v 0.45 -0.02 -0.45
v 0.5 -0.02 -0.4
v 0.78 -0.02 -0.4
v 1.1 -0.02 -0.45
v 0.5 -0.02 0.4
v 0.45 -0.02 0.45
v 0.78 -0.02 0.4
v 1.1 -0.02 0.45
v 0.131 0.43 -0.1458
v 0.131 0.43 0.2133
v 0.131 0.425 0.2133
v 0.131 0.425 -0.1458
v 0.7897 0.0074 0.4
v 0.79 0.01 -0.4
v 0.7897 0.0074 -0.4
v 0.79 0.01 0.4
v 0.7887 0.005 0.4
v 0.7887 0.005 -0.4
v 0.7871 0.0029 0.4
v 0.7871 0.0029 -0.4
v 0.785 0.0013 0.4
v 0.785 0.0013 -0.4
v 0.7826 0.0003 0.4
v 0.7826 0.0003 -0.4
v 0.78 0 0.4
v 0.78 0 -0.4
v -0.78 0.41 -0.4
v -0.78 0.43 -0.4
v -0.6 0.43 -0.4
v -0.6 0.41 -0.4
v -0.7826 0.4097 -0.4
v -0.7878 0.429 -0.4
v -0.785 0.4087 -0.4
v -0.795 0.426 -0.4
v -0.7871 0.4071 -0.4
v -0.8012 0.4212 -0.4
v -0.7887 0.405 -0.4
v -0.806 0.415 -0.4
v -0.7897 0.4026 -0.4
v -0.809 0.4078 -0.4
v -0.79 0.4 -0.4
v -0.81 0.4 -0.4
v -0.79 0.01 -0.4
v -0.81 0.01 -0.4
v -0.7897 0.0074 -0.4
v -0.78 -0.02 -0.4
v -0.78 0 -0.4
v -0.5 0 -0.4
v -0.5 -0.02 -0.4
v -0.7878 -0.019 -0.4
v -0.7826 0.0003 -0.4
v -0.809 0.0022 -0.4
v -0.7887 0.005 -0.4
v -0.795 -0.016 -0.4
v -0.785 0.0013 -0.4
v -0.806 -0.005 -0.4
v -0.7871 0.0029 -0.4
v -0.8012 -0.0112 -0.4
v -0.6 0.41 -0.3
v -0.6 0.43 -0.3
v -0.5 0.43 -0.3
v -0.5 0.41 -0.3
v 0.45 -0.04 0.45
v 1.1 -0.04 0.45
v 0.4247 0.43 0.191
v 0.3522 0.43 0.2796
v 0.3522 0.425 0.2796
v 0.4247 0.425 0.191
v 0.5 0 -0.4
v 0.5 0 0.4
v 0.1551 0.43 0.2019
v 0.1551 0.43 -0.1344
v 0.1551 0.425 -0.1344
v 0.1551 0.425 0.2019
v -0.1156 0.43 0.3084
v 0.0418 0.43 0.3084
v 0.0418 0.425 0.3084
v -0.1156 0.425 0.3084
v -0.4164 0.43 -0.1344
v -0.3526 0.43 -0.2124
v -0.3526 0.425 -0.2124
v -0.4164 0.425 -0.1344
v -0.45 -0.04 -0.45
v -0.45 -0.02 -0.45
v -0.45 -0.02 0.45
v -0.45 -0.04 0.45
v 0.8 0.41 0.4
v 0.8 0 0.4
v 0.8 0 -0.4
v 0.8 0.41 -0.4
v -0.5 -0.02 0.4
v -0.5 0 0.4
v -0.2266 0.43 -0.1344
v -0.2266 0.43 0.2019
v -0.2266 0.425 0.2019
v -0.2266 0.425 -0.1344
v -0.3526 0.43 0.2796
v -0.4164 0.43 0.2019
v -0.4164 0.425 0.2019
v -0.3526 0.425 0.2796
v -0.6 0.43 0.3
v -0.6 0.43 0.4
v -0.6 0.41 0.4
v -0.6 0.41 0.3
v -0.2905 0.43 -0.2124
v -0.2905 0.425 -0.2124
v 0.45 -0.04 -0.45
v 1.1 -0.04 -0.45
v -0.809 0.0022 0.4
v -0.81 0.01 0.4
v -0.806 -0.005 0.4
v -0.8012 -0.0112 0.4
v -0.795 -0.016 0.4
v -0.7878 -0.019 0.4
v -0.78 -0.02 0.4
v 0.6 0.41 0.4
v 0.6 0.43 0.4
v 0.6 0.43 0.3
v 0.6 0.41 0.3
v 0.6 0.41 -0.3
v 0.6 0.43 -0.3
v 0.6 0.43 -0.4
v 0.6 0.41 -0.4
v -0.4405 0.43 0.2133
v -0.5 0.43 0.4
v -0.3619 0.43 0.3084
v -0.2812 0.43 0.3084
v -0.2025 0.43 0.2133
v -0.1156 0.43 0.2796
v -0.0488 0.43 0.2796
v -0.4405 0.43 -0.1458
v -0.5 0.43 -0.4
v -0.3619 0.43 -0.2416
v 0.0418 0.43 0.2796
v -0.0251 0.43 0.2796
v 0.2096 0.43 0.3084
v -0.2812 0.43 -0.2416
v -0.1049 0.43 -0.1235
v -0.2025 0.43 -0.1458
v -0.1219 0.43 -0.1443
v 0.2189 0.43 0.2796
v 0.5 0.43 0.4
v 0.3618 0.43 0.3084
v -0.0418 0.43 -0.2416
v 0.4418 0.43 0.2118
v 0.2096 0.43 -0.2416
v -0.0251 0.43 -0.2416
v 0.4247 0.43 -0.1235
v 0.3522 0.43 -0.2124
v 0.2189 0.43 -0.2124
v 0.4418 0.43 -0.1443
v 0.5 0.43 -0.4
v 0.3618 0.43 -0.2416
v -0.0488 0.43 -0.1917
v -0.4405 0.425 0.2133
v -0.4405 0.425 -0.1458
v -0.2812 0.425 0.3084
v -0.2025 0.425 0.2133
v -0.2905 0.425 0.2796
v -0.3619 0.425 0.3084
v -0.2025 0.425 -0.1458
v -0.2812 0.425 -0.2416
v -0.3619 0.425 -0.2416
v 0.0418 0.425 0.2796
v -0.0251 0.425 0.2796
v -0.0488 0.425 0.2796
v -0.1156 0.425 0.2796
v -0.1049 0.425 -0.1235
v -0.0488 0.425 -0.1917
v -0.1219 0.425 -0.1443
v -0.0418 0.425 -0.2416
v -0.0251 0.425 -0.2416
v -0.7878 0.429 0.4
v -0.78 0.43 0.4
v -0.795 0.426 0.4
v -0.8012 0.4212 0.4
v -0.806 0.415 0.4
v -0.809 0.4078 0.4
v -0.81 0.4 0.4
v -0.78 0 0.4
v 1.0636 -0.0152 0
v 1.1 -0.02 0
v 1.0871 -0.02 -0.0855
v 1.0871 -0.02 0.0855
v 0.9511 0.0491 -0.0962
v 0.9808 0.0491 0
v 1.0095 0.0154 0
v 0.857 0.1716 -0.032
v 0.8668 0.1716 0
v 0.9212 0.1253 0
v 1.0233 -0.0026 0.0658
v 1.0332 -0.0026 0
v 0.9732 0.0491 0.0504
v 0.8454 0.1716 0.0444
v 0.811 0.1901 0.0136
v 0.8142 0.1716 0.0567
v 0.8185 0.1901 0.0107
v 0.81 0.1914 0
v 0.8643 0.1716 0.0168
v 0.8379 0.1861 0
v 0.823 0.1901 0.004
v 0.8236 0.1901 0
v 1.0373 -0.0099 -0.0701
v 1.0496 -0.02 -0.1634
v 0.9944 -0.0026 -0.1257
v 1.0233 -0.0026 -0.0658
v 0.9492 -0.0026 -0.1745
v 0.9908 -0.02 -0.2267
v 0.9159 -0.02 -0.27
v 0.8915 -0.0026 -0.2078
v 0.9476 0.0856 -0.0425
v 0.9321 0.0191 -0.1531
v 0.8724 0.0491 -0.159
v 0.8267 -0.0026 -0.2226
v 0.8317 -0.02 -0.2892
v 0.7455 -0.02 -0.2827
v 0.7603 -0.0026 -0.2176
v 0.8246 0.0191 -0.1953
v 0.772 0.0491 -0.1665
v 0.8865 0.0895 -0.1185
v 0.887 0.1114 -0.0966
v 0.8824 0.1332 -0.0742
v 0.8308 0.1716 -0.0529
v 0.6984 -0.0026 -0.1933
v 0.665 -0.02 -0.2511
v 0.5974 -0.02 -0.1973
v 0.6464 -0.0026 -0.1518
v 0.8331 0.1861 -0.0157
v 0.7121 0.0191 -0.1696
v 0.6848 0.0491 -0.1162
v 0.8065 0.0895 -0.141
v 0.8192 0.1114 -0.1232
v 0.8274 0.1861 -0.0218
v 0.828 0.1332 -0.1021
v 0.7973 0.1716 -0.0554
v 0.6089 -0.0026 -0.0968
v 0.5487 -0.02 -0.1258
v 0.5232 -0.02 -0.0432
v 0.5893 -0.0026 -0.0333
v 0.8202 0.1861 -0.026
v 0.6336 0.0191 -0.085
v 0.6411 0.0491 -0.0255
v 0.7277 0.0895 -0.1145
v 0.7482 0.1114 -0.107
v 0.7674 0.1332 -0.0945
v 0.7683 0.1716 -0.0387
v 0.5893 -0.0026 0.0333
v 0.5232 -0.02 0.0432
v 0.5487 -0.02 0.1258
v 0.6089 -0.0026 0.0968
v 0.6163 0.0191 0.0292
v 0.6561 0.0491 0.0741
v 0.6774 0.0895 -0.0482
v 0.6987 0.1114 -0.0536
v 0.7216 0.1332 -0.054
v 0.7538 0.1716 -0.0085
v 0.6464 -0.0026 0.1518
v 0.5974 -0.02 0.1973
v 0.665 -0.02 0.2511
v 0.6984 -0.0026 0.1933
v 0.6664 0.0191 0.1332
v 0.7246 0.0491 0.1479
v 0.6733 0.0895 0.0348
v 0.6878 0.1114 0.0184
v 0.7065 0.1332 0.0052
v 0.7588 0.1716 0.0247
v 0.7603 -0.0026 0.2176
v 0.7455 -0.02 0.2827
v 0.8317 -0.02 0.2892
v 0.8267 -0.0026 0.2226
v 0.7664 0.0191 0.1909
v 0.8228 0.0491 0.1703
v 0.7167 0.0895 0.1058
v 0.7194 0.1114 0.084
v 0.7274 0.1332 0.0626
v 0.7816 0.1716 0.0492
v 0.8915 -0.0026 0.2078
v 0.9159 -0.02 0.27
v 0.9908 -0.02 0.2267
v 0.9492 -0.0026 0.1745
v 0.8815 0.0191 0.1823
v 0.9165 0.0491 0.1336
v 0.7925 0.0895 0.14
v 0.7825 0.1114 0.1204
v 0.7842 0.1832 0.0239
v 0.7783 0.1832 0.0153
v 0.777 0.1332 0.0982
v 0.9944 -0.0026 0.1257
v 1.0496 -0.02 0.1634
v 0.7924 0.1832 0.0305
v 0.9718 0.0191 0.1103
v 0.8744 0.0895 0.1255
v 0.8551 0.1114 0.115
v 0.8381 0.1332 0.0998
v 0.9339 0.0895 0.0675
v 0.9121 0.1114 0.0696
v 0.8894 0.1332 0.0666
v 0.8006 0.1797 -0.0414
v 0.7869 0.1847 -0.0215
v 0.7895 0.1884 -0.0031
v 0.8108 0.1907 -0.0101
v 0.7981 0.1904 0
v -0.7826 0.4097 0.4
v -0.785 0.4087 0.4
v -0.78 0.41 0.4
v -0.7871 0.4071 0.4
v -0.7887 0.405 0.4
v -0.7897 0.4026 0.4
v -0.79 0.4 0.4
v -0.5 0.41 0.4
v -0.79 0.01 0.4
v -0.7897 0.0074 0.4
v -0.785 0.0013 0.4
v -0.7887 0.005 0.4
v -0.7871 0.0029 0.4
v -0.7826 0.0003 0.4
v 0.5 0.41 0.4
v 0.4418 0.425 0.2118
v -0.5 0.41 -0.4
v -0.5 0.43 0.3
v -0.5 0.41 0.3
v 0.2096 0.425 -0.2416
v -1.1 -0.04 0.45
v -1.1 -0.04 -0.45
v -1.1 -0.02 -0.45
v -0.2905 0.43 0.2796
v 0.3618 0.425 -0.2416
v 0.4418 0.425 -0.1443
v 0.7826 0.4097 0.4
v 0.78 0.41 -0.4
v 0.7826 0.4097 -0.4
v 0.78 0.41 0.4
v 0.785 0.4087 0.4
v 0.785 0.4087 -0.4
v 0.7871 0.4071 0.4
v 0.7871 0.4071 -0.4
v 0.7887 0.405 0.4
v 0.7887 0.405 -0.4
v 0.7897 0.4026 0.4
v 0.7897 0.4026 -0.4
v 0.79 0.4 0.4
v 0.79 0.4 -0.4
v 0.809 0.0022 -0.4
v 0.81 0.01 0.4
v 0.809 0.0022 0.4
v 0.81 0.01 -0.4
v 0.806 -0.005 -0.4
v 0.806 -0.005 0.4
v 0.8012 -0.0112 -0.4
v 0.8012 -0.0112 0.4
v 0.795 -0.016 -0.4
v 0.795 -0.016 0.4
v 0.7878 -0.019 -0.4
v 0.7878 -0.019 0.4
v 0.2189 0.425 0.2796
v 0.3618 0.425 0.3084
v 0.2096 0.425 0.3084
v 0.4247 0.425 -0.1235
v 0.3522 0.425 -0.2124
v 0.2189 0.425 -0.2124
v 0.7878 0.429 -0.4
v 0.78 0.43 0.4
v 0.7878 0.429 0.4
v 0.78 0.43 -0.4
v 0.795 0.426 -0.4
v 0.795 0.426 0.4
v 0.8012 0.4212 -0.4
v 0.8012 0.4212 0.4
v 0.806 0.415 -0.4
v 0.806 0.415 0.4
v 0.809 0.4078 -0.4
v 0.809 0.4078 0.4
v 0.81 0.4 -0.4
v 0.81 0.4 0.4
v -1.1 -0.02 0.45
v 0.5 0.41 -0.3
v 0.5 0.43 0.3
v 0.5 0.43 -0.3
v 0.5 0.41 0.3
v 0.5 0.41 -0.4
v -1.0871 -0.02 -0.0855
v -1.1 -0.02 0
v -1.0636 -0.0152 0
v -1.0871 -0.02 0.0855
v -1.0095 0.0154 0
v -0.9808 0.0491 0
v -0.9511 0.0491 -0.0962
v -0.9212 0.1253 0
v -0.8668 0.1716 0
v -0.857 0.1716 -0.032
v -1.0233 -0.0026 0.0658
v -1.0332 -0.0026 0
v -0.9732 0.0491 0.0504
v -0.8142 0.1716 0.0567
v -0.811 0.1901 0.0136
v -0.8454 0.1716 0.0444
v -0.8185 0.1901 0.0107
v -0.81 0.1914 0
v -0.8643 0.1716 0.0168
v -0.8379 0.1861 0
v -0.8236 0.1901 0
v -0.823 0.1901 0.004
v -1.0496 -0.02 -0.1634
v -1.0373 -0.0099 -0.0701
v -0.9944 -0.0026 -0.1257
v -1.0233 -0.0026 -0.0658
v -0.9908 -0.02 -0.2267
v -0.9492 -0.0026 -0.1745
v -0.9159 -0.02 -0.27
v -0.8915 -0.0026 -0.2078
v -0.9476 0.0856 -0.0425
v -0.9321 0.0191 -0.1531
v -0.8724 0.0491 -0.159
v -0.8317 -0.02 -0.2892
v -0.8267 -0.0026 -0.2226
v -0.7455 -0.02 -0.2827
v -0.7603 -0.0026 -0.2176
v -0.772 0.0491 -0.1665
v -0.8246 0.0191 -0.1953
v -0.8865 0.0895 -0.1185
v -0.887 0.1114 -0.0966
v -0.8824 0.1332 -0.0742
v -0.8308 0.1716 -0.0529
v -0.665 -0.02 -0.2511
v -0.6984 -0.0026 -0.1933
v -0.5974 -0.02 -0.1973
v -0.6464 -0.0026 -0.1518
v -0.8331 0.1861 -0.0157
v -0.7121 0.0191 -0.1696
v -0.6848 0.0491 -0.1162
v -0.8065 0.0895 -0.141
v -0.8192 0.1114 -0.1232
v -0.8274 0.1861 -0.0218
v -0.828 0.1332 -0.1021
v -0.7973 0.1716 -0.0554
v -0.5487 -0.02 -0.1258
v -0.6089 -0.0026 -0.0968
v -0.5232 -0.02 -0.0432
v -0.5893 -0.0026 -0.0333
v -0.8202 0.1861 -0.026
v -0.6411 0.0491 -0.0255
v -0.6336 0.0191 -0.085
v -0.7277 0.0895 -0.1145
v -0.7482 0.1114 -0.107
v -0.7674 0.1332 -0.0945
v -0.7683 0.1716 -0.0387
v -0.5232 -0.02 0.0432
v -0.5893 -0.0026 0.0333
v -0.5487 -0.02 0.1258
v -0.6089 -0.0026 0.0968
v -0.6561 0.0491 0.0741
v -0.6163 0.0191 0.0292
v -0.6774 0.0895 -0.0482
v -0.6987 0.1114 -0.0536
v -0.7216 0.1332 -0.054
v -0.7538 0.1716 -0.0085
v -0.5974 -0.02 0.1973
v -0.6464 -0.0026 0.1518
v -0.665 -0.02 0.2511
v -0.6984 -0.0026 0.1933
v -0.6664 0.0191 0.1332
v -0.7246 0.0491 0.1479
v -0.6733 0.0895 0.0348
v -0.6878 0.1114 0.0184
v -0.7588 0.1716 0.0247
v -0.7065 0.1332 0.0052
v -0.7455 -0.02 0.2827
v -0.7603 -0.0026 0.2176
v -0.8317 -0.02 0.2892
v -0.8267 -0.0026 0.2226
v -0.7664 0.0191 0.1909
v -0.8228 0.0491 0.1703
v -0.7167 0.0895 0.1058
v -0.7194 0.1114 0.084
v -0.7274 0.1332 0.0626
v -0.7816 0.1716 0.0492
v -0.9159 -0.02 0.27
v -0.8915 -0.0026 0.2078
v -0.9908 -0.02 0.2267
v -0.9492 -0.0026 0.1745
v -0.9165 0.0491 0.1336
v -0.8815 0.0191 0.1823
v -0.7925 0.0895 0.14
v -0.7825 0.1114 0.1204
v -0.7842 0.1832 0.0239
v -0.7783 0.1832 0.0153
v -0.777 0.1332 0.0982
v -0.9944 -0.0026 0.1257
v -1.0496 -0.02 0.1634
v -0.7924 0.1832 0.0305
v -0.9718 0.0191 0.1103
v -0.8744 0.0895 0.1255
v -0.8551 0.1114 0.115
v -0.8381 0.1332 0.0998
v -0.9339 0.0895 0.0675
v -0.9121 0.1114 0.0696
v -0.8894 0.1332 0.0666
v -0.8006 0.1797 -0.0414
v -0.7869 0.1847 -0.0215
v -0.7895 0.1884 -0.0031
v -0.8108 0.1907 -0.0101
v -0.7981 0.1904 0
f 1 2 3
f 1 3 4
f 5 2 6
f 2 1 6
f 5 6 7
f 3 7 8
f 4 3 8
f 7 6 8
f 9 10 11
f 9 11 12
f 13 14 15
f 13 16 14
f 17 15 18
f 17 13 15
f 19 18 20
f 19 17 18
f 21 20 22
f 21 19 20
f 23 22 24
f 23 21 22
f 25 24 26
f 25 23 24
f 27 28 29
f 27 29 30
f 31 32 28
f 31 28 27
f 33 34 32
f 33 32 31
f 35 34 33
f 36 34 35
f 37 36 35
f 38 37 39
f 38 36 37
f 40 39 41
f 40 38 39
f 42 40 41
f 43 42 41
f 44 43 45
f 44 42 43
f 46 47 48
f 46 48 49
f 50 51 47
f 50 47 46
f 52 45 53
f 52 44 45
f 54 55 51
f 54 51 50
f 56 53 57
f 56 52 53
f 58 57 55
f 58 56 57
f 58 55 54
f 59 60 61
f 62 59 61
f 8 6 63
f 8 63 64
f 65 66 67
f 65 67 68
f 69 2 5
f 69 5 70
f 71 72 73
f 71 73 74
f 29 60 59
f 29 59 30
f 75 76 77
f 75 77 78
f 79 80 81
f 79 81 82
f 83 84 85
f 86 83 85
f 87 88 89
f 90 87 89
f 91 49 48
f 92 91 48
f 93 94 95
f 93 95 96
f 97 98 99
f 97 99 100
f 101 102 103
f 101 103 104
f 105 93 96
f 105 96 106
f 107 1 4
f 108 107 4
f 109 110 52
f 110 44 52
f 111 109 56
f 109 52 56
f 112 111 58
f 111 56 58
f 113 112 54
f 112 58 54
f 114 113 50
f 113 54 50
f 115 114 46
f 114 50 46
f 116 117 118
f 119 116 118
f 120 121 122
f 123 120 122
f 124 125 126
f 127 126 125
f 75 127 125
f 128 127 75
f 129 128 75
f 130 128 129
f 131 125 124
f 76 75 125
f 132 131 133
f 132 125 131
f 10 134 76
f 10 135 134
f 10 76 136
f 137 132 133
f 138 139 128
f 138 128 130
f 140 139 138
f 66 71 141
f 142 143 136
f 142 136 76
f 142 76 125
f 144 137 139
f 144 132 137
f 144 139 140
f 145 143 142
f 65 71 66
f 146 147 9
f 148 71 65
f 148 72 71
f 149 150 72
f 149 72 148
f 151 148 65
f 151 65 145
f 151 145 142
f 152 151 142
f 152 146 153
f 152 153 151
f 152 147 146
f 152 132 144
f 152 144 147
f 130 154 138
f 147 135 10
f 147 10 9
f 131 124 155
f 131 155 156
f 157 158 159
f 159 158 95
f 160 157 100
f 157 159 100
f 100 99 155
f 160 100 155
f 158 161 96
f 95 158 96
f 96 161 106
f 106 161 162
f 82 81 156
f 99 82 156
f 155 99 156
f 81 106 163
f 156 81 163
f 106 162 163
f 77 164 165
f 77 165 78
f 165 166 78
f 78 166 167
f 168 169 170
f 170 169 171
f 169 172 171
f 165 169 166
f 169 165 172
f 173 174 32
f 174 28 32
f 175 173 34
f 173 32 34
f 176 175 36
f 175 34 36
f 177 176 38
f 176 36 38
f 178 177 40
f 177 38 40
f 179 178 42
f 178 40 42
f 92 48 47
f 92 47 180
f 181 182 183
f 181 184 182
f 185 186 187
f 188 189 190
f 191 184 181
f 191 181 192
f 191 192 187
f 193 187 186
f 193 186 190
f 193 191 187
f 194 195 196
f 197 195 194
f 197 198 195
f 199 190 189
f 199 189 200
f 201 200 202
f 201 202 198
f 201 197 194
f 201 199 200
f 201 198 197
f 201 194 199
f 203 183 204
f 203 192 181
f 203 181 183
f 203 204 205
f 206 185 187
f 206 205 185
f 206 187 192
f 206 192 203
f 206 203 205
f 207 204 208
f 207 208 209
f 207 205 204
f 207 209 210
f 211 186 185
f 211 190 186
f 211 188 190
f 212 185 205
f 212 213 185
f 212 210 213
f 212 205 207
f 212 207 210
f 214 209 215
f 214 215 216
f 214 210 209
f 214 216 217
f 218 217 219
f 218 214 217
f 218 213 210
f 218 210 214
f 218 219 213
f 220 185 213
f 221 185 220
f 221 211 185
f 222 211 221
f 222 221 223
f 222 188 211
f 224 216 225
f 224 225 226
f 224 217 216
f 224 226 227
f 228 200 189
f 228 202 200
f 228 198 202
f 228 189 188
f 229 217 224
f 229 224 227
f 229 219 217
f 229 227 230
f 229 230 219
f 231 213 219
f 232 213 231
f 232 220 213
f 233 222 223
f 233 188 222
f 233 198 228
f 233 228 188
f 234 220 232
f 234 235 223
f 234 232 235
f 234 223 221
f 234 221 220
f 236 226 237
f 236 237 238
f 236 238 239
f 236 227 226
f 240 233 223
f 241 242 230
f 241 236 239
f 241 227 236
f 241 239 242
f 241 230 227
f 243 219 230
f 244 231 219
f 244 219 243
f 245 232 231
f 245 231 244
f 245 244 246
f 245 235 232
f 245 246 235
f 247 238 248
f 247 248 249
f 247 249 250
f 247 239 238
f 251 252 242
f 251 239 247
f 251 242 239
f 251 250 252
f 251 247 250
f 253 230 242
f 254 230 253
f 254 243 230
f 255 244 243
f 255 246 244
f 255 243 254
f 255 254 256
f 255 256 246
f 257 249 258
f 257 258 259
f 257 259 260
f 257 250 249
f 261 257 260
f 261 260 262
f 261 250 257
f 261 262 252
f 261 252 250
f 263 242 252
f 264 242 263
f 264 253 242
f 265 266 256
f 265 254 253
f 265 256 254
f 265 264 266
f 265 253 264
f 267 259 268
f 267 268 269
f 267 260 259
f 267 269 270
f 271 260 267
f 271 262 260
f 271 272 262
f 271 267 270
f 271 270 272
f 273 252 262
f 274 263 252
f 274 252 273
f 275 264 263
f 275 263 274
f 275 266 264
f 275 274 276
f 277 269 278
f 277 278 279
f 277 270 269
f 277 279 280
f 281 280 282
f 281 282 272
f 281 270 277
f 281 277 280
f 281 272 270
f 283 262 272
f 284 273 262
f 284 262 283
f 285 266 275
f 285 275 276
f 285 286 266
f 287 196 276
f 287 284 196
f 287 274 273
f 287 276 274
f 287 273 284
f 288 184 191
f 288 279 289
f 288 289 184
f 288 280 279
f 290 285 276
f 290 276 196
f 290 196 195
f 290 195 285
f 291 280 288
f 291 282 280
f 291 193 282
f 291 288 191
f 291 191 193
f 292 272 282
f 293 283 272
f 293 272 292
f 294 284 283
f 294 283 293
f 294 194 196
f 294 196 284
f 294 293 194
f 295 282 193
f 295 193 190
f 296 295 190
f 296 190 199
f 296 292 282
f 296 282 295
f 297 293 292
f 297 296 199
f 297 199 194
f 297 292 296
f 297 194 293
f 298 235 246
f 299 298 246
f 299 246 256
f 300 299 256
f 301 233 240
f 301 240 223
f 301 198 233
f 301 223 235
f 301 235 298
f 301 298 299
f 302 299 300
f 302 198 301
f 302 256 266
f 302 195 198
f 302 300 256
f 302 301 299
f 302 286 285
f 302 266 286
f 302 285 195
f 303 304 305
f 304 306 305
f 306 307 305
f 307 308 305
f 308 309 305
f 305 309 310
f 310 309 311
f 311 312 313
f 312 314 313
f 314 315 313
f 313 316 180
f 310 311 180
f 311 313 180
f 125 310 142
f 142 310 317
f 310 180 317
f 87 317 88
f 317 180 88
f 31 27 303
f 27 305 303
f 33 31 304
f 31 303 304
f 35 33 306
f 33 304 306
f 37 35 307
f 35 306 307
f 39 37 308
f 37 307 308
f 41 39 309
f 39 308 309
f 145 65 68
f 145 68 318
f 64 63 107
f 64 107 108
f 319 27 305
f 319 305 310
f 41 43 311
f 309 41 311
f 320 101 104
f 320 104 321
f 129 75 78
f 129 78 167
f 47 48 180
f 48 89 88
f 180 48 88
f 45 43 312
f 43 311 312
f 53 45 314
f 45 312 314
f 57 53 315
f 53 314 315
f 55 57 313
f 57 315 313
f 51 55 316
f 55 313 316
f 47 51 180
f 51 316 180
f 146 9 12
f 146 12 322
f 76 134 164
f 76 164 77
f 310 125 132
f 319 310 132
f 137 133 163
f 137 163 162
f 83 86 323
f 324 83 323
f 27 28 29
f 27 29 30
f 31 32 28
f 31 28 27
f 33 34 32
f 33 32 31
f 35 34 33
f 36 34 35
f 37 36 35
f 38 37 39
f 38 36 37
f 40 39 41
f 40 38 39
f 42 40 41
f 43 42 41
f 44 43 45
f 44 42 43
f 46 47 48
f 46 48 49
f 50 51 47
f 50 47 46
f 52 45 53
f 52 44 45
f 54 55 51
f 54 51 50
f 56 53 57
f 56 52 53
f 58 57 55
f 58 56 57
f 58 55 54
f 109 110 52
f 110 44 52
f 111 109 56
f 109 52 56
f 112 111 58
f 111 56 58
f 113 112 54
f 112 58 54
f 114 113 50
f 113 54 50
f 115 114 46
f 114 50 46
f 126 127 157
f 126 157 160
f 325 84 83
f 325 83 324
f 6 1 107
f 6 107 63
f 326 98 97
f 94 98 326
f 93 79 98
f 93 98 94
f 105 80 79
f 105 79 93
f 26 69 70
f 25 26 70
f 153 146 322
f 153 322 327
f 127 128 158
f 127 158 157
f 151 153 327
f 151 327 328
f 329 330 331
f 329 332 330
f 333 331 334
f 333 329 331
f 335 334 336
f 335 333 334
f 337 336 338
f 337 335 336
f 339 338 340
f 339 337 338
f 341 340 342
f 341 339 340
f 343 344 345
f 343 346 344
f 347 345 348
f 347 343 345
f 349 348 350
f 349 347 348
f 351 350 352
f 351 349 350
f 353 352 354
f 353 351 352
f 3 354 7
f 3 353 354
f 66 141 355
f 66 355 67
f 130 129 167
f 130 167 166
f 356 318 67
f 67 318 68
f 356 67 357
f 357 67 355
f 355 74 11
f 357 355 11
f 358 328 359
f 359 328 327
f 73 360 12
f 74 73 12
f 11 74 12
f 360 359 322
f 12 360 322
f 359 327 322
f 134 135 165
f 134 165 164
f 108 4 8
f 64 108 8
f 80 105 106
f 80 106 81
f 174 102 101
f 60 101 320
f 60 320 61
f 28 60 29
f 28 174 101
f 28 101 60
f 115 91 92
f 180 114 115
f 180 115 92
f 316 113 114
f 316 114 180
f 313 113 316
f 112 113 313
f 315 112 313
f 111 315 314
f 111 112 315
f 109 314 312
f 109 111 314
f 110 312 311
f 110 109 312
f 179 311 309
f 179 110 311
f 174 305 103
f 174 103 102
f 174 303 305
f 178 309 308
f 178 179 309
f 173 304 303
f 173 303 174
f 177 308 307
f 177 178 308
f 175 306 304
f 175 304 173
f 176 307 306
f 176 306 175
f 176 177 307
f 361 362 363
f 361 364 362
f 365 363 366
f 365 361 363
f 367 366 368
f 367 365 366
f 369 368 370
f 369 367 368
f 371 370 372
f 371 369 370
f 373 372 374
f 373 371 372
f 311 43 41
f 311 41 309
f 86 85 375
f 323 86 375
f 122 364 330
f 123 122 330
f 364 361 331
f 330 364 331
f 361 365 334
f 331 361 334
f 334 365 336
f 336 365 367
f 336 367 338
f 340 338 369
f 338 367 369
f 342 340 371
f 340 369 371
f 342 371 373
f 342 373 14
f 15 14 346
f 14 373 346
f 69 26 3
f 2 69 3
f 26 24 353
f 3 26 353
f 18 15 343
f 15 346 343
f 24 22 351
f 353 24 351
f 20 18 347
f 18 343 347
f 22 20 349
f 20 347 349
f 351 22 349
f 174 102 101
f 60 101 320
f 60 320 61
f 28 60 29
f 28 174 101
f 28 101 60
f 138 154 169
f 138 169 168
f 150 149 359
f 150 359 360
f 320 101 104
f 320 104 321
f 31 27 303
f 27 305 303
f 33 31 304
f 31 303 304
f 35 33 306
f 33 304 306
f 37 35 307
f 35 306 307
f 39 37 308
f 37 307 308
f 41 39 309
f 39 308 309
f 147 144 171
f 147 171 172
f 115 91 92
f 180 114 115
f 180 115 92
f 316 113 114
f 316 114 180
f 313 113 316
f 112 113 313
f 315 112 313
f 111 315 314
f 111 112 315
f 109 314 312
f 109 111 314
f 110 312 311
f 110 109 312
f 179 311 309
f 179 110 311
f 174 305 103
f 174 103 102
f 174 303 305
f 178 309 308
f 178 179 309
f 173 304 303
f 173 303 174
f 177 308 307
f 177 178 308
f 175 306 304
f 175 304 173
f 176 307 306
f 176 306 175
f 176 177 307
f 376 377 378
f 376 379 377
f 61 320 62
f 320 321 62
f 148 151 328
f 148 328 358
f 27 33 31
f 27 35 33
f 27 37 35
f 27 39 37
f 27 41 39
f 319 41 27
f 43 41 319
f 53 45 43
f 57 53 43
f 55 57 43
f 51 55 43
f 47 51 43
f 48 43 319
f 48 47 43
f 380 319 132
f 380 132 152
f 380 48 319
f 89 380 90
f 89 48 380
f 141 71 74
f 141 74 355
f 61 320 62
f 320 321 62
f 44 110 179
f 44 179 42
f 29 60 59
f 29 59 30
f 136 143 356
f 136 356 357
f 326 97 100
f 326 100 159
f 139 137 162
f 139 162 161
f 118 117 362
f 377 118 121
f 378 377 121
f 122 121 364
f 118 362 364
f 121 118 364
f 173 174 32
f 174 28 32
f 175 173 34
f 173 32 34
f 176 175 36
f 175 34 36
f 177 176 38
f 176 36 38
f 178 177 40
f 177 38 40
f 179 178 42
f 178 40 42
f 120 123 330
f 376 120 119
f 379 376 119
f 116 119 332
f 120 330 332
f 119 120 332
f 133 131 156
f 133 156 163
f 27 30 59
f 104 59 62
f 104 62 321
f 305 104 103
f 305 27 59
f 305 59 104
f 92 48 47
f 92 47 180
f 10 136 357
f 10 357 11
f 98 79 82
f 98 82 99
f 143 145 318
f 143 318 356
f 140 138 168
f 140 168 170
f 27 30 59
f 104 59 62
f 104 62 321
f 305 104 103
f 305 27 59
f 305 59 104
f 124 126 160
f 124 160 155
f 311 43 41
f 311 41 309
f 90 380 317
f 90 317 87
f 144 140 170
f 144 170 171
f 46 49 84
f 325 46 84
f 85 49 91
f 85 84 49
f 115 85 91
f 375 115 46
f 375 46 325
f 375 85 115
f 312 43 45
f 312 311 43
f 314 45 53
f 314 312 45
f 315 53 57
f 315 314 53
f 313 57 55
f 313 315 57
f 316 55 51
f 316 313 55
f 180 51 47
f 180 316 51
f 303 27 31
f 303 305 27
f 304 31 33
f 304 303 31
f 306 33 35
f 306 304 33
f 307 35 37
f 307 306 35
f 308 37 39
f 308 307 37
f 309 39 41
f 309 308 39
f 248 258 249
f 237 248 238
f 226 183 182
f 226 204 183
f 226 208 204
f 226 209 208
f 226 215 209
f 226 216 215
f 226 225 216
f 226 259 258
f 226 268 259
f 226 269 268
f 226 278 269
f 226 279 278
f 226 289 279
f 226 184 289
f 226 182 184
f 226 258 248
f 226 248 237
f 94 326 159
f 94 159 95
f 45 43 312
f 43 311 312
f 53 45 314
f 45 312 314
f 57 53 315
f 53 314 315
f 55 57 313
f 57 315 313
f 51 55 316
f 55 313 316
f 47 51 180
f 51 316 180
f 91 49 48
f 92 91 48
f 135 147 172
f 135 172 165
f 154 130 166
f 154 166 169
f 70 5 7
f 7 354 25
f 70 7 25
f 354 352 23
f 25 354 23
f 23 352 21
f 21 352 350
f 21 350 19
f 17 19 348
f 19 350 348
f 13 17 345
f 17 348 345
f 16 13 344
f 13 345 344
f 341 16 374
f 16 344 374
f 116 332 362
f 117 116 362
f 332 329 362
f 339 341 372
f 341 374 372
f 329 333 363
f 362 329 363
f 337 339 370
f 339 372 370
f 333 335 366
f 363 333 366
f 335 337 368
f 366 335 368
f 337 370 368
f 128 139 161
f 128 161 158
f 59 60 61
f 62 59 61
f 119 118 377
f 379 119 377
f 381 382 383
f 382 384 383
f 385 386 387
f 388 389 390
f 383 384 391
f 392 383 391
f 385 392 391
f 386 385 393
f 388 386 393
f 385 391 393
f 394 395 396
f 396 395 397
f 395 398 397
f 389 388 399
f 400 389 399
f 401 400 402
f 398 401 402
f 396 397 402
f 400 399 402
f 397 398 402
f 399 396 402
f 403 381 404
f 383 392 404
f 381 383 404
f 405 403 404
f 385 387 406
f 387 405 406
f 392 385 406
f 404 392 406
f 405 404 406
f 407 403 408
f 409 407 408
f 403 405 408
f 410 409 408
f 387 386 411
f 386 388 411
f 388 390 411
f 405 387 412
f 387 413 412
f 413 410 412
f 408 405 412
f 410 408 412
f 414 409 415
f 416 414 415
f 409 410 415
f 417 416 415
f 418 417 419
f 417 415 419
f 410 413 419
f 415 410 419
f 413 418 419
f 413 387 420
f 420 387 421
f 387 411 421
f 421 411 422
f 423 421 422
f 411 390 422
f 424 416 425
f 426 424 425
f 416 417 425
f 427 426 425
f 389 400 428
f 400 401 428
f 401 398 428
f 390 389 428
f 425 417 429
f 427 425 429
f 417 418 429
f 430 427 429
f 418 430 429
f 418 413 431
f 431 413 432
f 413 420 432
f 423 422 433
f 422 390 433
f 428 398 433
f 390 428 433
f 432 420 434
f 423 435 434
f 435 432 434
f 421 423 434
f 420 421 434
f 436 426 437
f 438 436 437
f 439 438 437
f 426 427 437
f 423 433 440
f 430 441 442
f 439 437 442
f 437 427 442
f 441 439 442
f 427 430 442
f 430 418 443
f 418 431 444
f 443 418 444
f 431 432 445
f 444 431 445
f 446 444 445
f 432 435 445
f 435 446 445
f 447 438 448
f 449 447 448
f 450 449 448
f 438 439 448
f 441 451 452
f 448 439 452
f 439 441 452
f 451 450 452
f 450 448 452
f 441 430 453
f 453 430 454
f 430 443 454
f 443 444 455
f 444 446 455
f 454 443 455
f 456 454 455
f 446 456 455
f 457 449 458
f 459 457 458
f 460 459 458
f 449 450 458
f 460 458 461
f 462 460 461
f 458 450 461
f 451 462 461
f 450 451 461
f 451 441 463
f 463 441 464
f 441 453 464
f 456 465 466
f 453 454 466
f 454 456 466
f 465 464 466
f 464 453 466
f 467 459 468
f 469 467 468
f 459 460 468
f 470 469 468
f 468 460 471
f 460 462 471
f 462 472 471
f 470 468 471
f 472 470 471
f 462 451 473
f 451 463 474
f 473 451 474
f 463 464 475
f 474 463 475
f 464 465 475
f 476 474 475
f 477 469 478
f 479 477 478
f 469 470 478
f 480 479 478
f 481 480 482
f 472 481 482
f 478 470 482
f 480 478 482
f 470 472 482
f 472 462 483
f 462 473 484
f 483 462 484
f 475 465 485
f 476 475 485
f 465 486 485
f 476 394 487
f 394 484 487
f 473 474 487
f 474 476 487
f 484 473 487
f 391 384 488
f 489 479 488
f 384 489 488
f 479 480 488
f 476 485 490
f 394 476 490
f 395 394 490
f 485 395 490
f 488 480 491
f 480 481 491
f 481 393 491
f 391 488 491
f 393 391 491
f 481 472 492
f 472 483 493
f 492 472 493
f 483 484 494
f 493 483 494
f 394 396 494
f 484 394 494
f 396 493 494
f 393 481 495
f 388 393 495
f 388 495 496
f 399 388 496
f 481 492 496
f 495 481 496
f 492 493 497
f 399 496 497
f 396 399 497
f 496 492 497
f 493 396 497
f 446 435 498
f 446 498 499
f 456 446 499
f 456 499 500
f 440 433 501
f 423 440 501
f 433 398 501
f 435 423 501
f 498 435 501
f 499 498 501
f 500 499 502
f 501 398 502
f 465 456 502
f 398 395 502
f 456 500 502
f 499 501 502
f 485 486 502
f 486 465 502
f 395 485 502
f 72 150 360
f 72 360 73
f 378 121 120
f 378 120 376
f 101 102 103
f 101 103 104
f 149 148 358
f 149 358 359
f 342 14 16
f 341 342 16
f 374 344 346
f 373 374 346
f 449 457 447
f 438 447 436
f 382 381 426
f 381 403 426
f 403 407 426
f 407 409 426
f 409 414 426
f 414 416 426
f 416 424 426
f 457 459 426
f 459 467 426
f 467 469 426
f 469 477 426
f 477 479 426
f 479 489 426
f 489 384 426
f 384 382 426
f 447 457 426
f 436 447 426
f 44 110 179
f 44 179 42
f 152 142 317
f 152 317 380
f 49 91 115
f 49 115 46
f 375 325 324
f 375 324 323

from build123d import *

# Parameters (mm, degrees)
CROQUIS1_W              = 1.6
CROQUIS1_H              = 0.8
SALIENTE_EXTRUIR1_DEPTH = 0.43
CROQUIS5_W              = 0.3
CROQUIS5_H              = 0.8
CORTAR_EXTRUIR1_DEPTH   = 0.02
CROQUIS2_W              = 0.8
CROQUIS2_H              = 0.02
CROQUIS2_2_W            = 0.8
CROQUIS2_2_H            = 0.02
CROQUIS6_W              = 0.1
CROQUIS6_H              = 0.1
CORTAR_EXTRUIR2_DEPTH   = 0.02
CROQUIS7_W              = 0.3
CROQUIS7_H              = 0.8
CORTAR_EXTRUIR3_DEPTH   = 0.02
CORTAR_EXTRUIR4_DEPTH   = 0.005
CROQUIS10_W             = 0.65
CROQUIS10_H             = 0.9
SALIENTE_EXTRUIR2_DEPTH = 0.02


# Read off the part's stored shape, not the designer's step: Revolución1
with BuildPart() as part:
    # Croquis1 → Saliente-Extruir1 (new body)
    with BuildSketch(Plane(origin=(0, 0, 0), x_dir=(1, 0, 0), z_dir=(0, 1, 0))):
        Rectangle(CROQUIS1_W, CROQUIS1_H)
    extrude(amount=SALIENTE_EXTRUIR1_DEPTH)

    # Croquis5 → Cortar-Extruir1 (cut)
    with BuildSketch(Plane(origin=(0, 0.43, 0), x_dir=(1, 0, 0), z_dir=(0, 1, 0))):
        with Locations((-0.65, 0)):
            Rectangle(CROQUIS5_W, CROQUIS5_H)
    extrude(amount=-CORTAR_EXTRUIR1_DEPTH, mode=Mode.SUBTRACT)

    # Cortar-Barrer2: sweep along a path in Croquis3
    with BuildLine(Plane.XY) as cortar_barrer2_path:
        Line((-0.5, 0.42), (-0.78, 0.42))
        ThreePointArc((-0.78, 0.42), (-0.794142136, 0.414142136), (-0.8, 0.4))
        Line((-0.8, 0.4), (-0.8, 0.01))
        ThreePointArc((-0.8, 0.01), (-0.794142136, -0.004142136), (-0.78, -0.01))
        Line((-0.78, -0.01), (-0.5, -0.01))
    # Croquis2 → Cortar-Barrer2 (sweep, cut)
    with BuildSketch(Plane.ZY.offset(0.5)):
        with Locations((0, 0.42)):
            Rectangle(CROQUIS2_W, CROQUIS2_H)
    sweep(path=cortar_barrer2_path.line, mode=Mode.SUBTRACT)

    # Croquis7 → Cortar-Extruir3 (cut)
    with BuildSketch(Plane(origin=(0, 0.43, 0), x_dir=(1, 0, 0), z_dir=(0, 1, 0))):
        with Locations((0.65, 0)):
            Rectangle(CROQUIS7_W, CROQUIS7_H)
    extrude(amount=-CORTAR_EXTRUIR3_DEPTH, mode=Mode.SUBTRACT)

    # Croquis8 → Cortar-Extruir4 (cut)
    # profile 1 of 3: a face of its own
    with BuildSketch(Plane(origin=(0, 0.43, 0), x_dir=(1, 0, 0), z_dir=(0, 1, 0))):
        Polygon((-0.202483801, -0.213282937), (-0.281209503, -0.308423326), (-0.36187905, -0.308423326), (-0.44049676, -0.213282937), (-0.44049676, 0.145788337), (-0.36187905, 0.241576674), (-0.281209503, 0.241576674), (-0.202483801, 0.145788337), align=None)
        Polygon((-0.226565875, -0.201943844), (-0.226565875, 0.134449244), (-0.29049676, 0.212419006), (-0.352591793, 0.212419006), (-0.416414687, 0.134449244), (-0.416414687, -0.201943844), (-0.352591793, -0.279589633), (-0.29049676, -0.279589633), align=None, mode=Mode.SUBTRACT)
    # profile 2 of 3: a face of its own
    with BuildSketch(Plane(origin=(0, 0.43, 0), x_dir=(1, 0, 0), z_dir=(0, 1, 0))):
        Polygon((0.041792657, -0.308423326), (-0.115550756, -0.308423326), (-0.115550756, -0.279589633), (-0.048812095, -0.279589633), (-0.048812095, 0.191684665), (-0.104859611, 0.123542117), (-0.121922246, 0.144276458), (-0.041792657, 0.241576674), (-0.025053996, 0.241576674), (-0.025053996, -0.279589633), (0.041792657, -0.279589633), align=None)
    # profile 3 of 3: a face of its own
    with BuildSketch(Plane(origin=(0, 0.43, 0), x_dir=(1, 0, 0), z_dir=(0, 1, 0))):
        Polygon((0.441792657, -0.211771058), (0.361771058, -0.308423326), (0.209611231, -0.308423326), (0.130993521, -0.213282937), (0.130993521, 0.145788337), (0.209611231, 0.241576674), (0.361771058, 0.241576674), (0.441792657, 0.144276458), (0.424730022, 0.123542117), (0.352159827, 0.212419006), (0.218898488, 0.212419006), (0.155075594, 0.134449244), (0.155075594, -0.201943844), (0.218898488, -0.279589633), (0.352159827, -0.279589633), (0.424730022, -0.191036717), align=None)
    extrude(amount=-CORTAR_EXTRUIR4_DEPTH, mode=Mode.SUBTRACT)


with BuildPart() as body_2:
    # Barrer1: sweep along a path in Croquis3<2>
    with BuildLine(Plane.XY) as barrer1_path:
        Line((-0.5, 0.42), (-0.78, 0.42))
        ThreePointArc((-0.78, 0.42), (-0.794142136, 0.414142136), (-0.8, 0.4))
        Line((-0.8, 0.4), (-0.8, 0.01))
        ThreePointArc((-0.8, 0.01), (-0.794142136, -0.004142136), (-0.78, -0.01))
        Line((-0.78, -0.01), (-0.5, -0.01))
    # Croquis2<2> → Barrer1 (sweep)
    with BuildSketch(Plane.ZY.offset(0.5)):
        with Locations((0, 0.42)):
            Rectangle(CROQUIS2_2_W, CROQUIS2_2_H)
    sweep(path=barrer1_path.line)

    # Croquis6 → Cortar-Extruir2 (cut)
    with BuildSketch(Plane(origin=(0, 0.43, 0), x_dir=(1, 0, 0), z_dir=(0, 1, 0))):
        with Locations((-0.55, -0.35)):
            Rectangle(CROQUIS6_W, CROQUIS6_H)
        with Locations((-0.55, 0.35)):
            Rectangle(CROQUIS6_W, CROQUIS6_H)
    extrude(amount=-CORTAR_EXTRUIR2_DEPTH, mode=Mode.SUBTRACT)


with BuildPart() as body_3:
    # Simetría4: mirrored copy
    add(body_2.part.mirror(Plane(origin=(0, 0, 0), x_dir=(0, 0, 1), z_dir=(1, 0, 0))))

    # Croquis10 → Saliente-Extruir2 (add)
    with BuildSketch(Plane.XZ.offset(0.02)):
        with Locations((0.775, 0)):
            Rectangle(CROQUIS10_W, CROQUIS10_H)
    extrude(amount=SALIENTE_EXTRUIR2_DEPTH)


with BuildPart() as body_4:
    # Revolución1 outline → Revolución1 (revolve)
    with BuildSketch(Plane(origin=(0.81, 0, 0), x_dir=(1, 0, 0), z_dir=(0, 0, 1))):
        with BuildLine():
            Line((0, -0.02), (0.29, -0.02))
            add(Edge.make_bspline(
                [(0.29, -0.02), (0.233020144, -0.02), (0.155789366, 0.011440674), (0.188536625, 0.070000696), (0.072556751, 0.192836807), (0, 0.191393605)],
                knots=[0, 0, 0, 0, 0, 0, 1, 1, 1, 1, 1, 1], degree=5))
            Line((0, 0.191393605), (0, -0.02))
        make_face()
    revolve(axis=Axis((0.81, 0, 0), (0, 1, 0)))


with BuildPart() as body_5:
    # Simetría5: mirrored copy
    add(body_4.part.mirror(Plane(origin=(0, 0, 0), x_dir=(0, 0, 1), z_dir=(1, 0, 0))))


with BuildPart() as body_6:
    # Simetr_a5 2: mirrored copy
    add(body_3.part.mirror(Plane(origin=(0, 0, 0), x_dir=(0, 0, 1), z_dir=(1, 0, 0))))


solid = Compound([part.part, body_2.part, body_3.part, body_4.part, body_5.part, body_6.part])
